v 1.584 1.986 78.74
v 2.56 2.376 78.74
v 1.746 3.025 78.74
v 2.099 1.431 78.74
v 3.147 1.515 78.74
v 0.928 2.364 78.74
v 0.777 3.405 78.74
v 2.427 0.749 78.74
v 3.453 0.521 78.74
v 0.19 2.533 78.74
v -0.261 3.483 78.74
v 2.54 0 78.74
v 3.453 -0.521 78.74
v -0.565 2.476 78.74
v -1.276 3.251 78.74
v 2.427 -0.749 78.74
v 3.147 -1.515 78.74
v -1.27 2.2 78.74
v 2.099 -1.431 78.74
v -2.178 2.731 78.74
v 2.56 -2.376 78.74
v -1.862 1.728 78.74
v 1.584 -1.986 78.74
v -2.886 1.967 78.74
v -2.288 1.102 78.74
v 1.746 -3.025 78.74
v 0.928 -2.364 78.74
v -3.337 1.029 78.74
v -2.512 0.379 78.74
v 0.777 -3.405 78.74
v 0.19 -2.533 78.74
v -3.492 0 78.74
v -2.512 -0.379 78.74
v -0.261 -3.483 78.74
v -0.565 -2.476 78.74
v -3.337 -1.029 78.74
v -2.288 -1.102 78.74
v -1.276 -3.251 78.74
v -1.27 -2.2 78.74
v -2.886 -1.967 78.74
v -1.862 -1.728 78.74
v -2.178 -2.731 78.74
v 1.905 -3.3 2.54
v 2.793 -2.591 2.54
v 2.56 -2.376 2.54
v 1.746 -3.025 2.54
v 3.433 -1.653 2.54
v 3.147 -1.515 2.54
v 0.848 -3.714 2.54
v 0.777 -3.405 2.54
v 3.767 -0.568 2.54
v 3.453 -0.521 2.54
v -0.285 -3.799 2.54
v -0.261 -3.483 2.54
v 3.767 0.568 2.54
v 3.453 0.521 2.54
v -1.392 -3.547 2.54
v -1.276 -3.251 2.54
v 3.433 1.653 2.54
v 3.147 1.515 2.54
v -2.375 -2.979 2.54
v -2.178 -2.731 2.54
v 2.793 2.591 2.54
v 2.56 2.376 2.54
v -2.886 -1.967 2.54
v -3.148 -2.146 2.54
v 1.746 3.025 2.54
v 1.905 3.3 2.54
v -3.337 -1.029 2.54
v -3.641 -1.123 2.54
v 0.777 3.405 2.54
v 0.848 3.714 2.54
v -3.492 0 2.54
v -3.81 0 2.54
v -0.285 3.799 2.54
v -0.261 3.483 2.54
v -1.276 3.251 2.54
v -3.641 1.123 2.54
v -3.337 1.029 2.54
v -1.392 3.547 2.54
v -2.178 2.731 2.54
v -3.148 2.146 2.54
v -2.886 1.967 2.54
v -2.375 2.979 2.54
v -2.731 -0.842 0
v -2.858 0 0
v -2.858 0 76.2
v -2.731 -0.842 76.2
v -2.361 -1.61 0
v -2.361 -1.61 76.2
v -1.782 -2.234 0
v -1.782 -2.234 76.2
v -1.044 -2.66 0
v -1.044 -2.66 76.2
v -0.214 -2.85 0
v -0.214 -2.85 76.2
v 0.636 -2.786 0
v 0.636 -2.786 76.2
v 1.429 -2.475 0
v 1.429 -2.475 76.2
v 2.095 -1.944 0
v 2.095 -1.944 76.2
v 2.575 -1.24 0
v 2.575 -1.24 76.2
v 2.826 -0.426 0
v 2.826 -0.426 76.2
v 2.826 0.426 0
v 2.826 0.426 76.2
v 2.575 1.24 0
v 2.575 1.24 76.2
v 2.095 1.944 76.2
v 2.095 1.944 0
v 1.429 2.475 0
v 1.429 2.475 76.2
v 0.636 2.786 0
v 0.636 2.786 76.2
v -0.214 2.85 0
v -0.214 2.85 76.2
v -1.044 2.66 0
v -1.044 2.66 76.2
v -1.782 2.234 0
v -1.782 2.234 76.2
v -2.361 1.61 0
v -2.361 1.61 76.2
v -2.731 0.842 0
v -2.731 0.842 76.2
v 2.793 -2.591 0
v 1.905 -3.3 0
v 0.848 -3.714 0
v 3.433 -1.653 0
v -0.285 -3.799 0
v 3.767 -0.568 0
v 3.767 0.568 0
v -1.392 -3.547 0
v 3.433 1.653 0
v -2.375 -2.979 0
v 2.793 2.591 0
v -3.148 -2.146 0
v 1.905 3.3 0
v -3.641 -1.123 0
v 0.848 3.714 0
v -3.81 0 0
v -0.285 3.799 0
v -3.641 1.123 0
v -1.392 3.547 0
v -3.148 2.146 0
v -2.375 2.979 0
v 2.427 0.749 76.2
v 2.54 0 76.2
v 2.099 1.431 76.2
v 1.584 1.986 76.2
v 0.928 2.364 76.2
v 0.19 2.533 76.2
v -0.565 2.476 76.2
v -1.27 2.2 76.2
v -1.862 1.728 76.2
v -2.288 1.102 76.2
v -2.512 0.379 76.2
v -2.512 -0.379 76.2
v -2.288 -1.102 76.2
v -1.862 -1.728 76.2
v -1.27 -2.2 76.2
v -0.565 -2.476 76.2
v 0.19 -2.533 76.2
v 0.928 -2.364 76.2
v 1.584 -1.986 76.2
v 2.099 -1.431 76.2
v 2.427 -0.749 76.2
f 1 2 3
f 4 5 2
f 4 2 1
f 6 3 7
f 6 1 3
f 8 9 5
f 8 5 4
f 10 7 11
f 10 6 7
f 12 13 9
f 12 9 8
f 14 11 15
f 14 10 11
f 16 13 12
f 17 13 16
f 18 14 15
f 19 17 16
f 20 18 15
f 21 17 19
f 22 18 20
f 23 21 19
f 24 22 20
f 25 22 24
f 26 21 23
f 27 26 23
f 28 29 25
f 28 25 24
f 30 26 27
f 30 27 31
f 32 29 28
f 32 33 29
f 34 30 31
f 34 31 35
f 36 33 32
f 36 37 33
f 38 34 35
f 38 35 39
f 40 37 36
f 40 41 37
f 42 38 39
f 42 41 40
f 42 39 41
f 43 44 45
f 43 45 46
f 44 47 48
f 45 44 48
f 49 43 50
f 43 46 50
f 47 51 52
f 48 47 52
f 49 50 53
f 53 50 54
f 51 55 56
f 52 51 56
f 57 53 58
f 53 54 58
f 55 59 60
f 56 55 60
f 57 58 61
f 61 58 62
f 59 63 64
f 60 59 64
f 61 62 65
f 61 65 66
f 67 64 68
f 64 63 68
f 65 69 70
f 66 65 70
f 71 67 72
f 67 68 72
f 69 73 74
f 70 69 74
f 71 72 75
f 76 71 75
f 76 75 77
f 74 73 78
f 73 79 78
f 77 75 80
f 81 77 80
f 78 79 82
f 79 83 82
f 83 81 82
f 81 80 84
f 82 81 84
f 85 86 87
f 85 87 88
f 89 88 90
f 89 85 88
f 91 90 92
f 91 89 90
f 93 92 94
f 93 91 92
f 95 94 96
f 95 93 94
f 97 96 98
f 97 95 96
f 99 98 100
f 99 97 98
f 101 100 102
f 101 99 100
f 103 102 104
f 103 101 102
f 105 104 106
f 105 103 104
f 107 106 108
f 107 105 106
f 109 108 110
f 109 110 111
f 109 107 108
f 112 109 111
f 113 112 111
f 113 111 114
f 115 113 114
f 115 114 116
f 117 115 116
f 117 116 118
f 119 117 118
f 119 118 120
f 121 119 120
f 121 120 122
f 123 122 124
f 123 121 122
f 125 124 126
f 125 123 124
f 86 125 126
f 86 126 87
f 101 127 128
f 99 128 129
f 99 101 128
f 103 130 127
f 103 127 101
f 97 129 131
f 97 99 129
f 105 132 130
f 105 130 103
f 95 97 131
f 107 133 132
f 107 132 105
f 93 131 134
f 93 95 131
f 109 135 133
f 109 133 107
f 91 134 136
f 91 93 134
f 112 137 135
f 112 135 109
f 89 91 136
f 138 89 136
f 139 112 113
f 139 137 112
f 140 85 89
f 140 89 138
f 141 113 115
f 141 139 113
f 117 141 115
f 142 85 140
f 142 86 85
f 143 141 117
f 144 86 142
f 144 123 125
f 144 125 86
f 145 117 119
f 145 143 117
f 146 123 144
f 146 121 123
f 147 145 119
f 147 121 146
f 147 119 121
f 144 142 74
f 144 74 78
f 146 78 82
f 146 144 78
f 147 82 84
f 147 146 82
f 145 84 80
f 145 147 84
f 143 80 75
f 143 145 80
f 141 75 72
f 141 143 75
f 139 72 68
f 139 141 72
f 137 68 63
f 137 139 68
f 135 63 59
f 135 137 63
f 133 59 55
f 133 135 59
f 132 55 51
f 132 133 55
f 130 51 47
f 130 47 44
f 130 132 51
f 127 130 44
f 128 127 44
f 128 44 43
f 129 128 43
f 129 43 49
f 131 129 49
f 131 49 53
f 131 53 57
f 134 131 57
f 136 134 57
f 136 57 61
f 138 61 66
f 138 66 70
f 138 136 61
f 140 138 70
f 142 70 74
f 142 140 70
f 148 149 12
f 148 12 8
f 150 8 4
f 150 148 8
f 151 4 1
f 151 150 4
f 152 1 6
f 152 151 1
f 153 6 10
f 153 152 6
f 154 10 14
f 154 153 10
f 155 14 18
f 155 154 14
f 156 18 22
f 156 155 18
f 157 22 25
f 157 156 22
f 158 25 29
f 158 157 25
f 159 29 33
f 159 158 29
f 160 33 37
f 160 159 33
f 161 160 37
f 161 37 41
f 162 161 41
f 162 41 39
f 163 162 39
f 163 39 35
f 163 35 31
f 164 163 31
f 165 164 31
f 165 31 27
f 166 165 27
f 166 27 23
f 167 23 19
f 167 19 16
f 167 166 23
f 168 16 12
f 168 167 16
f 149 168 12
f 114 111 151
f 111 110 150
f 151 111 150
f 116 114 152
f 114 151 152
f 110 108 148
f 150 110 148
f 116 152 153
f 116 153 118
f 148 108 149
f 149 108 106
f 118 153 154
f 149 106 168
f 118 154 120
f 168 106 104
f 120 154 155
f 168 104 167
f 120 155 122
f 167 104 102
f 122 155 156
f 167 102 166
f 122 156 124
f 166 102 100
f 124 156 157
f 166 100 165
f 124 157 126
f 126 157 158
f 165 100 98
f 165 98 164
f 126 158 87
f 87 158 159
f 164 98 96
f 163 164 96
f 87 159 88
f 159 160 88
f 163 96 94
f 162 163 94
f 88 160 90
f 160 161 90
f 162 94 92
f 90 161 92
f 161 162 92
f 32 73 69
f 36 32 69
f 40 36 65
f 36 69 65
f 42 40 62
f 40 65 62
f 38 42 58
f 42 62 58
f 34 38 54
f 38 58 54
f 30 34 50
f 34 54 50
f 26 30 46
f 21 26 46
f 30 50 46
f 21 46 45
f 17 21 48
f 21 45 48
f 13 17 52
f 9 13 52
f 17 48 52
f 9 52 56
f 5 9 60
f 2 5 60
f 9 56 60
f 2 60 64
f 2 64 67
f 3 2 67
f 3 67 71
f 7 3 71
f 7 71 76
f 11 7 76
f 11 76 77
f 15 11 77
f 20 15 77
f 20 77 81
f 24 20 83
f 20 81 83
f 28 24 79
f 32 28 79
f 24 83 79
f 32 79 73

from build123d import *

# Parameters (mm, degrees)
SKETCH1_R           = 3.4925
SKETCH1_R_2         = 2.8575
BOSS_EXTRUDE1_DEPTH = 76.2
SKETCH2_R           = 3.4925
SKETCH2_R_2         = 2.54
BOSS_EXTRUDE2_DEPTH = 2.54
SKETCH3_R           = 3.81
SKETCH3_R_2         = 3.4925
BOSS_EXTRUDE3_DEPTH = 2.54


with BuildPart() as part:
    # Sketch1 → Boss-Extrude1 (new body)
    with BuildSketch(Plane.XY):
        with Locations(Location((0, 0, 0), (0, 0, 180))):
            Circle(SKETCH1_R)
        with Locations(Location((0, 0, 0), (0, 0, 180))):
            Circle(SKETCH1_R_2, mode=Mode.SUBTRACT)
    extrude(amount=BOSS_EXTRUDE1_DEPTH)

    # Sketch2 → Boss-Extrude2 (add)
    with BuildSketch(Plane.XY.offset(76.2)):
        with Locations(Location((0, 0, 0), (0, 0, 180))):
            Circle(SKETCH2_R)
        Circle(SKETCH2_R_2, mode=Mode.SUBTRACT)
    extrude(amount=BOSS_EXTRUDE2_DEPTH)

    # Sketch3 → Boss-Extrude3 (add)
    with BuildSketch(Plane(origin=(0, 0, 0), x_dir=(-1, 0, 0), z_dir=(0, 0, -1))):
        Circle(SKETCH3_R)
        Circle(SKETCH3_R_2, mode=Mode.SUBTRACT)
    extrude(amount=-BOSS_EXTRUDE3_DEPTH)


solid = part.part
